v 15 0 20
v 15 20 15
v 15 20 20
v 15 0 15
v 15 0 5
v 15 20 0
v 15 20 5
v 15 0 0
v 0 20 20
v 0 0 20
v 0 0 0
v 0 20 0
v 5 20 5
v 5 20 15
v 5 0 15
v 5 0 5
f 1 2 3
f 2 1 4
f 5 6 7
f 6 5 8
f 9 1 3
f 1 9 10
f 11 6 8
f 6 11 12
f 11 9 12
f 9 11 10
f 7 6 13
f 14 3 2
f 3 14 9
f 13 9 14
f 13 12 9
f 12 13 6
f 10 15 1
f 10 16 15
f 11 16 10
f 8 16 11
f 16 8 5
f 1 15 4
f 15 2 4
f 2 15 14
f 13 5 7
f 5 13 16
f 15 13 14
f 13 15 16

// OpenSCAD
difference()
{
    cube([15,20,20]);
    translate([5,-5,5]) cube([15,30,10]);
}
